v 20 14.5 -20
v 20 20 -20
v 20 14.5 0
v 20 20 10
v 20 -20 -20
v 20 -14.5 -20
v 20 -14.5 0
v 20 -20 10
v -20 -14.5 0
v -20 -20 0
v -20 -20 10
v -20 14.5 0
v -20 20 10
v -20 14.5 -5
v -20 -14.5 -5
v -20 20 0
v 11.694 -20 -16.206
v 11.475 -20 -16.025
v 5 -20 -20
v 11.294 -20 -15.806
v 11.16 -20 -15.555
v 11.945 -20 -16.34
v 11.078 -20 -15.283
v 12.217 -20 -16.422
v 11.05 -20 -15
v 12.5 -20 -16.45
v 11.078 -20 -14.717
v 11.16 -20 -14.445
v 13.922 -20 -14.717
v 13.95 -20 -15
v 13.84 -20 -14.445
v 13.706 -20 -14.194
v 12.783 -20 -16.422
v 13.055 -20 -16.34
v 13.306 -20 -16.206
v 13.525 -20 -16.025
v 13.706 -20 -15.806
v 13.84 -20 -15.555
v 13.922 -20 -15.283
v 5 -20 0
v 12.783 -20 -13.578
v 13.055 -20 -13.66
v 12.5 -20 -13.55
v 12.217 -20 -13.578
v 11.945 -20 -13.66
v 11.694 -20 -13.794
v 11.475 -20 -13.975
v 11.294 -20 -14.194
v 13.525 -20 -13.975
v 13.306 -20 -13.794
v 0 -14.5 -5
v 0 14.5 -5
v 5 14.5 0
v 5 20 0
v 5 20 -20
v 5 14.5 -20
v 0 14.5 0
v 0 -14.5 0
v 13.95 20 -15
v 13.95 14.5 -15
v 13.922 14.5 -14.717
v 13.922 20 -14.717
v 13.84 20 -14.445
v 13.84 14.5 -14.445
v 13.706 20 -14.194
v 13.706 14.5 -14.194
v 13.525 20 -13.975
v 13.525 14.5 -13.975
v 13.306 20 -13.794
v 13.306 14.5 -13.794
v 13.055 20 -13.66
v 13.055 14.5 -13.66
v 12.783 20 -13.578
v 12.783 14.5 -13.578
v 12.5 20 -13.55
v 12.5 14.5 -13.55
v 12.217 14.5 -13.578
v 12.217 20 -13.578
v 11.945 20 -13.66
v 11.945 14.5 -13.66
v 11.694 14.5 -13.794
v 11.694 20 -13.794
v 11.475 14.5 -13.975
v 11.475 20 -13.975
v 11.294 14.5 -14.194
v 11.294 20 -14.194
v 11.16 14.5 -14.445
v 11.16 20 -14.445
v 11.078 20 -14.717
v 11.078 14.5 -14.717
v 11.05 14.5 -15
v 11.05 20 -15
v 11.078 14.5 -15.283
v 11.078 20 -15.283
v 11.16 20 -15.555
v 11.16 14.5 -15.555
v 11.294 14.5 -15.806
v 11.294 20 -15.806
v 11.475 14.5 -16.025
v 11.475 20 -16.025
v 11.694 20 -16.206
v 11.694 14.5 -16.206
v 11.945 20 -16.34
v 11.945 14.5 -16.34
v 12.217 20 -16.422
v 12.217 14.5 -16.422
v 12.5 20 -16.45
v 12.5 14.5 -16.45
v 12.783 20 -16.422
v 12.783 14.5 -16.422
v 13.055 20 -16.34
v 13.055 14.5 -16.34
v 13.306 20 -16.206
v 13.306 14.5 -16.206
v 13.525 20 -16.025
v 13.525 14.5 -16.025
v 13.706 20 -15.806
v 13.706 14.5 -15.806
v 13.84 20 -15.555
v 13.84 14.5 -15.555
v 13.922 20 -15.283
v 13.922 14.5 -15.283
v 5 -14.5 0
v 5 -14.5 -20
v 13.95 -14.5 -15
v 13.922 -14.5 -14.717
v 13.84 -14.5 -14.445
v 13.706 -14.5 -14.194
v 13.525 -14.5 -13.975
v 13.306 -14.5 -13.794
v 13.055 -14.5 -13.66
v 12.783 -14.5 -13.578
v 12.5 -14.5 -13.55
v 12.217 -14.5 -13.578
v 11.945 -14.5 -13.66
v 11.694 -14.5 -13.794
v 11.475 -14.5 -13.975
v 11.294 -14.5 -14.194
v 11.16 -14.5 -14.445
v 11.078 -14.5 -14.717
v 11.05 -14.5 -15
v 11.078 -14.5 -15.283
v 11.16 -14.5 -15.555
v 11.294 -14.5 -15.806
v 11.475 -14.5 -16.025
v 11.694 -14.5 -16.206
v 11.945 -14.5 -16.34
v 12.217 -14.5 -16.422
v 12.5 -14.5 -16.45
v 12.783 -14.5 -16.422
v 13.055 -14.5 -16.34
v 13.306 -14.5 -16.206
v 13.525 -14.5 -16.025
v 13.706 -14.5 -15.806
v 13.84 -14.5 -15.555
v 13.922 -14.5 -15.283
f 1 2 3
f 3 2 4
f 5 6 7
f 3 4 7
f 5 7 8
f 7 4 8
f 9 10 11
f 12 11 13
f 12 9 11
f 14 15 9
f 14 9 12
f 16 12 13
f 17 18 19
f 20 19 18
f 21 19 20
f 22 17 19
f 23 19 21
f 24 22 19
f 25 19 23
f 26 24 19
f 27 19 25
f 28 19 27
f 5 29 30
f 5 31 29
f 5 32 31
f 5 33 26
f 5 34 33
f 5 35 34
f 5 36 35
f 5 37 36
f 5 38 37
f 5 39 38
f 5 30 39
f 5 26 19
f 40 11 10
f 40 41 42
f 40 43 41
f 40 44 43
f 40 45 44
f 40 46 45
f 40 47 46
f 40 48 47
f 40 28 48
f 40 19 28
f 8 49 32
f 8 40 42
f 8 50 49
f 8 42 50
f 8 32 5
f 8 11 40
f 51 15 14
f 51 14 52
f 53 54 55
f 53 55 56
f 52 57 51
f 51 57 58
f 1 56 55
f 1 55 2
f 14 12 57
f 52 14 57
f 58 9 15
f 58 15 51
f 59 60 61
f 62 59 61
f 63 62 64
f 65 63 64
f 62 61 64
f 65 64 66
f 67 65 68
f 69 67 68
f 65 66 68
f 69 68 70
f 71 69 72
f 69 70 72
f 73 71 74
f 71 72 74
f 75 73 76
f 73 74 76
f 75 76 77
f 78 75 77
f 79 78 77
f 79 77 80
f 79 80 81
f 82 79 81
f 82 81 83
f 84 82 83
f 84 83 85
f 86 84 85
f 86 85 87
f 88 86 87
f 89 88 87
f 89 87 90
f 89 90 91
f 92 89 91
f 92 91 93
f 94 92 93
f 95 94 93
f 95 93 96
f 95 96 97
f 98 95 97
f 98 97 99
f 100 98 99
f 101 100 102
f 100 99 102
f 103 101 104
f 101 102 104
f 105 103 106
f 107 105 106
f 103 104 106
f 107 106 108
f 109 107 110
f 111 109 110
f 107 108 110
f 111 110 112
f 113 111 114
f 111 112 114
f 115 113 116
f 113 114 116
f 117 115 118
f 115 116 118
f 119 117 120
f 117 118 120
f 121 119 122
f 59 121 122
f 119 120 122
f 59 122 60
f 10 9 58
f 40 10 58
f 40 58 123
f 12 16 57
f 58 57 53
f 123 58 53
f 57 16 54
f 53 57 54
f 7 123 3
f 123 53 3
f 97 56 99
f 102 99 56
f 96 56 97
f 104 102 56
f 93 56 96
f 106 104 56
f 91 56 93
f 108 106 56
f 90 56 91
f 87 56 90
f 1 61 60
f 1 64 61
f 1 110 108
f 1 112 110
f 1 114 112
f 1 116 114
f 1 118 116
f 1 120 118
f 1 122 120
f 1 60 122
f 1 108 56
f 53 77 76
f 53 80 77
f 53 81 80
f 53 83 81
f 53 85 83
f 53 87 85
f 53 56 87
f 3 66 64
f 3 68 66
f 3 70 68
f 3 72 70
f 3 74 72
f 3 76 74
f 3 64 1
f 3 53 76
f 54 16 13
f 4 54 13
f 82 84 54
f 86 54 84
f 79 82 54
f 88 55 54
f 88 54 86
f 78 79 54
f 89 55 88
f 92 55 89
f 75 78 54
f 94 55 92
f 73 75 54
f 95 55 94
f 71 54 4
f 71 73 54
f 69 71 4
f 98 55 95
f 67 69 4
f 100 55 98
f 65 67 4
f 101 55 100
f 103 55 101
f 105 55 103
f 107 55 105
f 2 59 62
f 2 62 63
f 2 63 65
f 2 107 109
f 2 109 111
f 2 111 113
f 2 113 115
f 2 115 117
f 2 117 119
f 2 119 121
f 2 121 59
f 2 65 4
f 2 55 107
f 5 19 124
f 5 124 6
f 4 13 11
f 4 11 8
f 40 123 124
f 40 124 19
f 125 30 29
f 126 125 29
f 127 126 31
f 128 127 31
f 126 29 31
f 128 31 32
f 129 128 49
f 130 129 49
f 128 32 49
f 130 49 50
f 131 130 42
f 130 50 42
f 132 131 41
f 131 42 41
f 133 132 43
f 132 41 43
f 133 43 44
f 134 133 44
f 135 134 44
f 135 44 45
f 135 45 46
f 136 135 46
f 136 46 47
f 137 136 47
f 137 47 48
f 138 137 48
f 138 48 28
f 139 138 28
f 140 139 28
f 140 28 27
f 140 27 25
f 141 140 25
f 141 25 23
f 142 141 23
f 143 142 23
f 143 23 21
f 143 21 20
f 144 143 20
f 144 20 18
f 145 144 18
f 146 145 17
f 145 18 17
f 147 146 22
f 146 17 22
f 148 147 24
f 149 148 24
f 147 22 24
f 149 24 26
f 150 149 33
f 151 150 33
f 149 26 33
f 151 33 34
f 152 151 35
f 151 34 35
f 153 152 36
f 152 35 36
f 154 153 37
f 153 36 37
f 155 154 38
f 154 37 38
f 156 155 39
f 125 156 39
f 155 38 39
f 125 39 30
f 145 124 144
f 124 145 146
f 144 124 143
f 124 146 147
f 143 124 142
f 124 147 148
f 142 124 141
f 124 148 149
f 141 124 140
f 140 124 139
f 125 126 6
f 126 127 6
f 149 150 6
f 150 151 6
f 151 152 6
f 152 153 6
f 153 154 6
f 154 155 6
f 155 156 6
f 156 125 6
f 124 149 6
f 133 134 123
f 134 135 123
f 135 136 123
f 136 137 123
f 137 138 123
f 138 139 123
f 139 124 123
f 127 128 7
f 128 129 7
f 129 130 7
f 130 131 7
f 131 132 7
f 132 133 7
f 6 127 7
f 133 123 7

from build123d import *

# Parameters (mm, degrees)
F0_W     = 40
F0_H     = 40
F1_DEPTH = 10
F2_W     = 20
F2_H     = 29
F3_DEPTH = 5
F4_W     = 15
F4_H     = 5.5
F5_DEPTH = 20
F6_R     = 1.45
F7_DEPTH = 53.2


# Not quite as in the source:
# - a feature names something its author has since deleted; it is built from what else it names


with BuildPart() as f1:
    # F0 (on Top) → F1 (new body)
    with BuildSketch(Plane.XY):
        Rectangle(F0_W, F0_H)
    extrude(amount=F1_DEPTH)

    # F2 (on face) → F3 (join)
    with BuildSketch(Plane(origin=(0, 0, 0), x_dir=(1, 0, 0), z_dir=(0, 0, -1))):
        with Locations((-10, 0)):
            Rectangle(F2_W, F2_H)
    extrude(amount=F3_DEPTH)

    # F4 (on face) → F5 (join)
    with BuildSketch(Plane(origin=(0, 0, 0), x_dir=(1, 0, 0), z_dir=(0, 0, -1))):
        with Locations((12.5, 17.25)):
            Rectangle(F4_W, F4_H)
        with Locations((12.5, -17.25)):
            Rectangle(F4_W, F4_H)
    extrude(amount=F5_DEPTH)

    # F6 (on face) → F7 (cut)
    with BuildSketch(Plane.XZ.offset(20)):
        with Locations((12.5, -15)):
            Circle(F6_R)
    extrude(amount=-F7_DEPTH, mode=Mode.SUBTRACT)


solid = f1.part
